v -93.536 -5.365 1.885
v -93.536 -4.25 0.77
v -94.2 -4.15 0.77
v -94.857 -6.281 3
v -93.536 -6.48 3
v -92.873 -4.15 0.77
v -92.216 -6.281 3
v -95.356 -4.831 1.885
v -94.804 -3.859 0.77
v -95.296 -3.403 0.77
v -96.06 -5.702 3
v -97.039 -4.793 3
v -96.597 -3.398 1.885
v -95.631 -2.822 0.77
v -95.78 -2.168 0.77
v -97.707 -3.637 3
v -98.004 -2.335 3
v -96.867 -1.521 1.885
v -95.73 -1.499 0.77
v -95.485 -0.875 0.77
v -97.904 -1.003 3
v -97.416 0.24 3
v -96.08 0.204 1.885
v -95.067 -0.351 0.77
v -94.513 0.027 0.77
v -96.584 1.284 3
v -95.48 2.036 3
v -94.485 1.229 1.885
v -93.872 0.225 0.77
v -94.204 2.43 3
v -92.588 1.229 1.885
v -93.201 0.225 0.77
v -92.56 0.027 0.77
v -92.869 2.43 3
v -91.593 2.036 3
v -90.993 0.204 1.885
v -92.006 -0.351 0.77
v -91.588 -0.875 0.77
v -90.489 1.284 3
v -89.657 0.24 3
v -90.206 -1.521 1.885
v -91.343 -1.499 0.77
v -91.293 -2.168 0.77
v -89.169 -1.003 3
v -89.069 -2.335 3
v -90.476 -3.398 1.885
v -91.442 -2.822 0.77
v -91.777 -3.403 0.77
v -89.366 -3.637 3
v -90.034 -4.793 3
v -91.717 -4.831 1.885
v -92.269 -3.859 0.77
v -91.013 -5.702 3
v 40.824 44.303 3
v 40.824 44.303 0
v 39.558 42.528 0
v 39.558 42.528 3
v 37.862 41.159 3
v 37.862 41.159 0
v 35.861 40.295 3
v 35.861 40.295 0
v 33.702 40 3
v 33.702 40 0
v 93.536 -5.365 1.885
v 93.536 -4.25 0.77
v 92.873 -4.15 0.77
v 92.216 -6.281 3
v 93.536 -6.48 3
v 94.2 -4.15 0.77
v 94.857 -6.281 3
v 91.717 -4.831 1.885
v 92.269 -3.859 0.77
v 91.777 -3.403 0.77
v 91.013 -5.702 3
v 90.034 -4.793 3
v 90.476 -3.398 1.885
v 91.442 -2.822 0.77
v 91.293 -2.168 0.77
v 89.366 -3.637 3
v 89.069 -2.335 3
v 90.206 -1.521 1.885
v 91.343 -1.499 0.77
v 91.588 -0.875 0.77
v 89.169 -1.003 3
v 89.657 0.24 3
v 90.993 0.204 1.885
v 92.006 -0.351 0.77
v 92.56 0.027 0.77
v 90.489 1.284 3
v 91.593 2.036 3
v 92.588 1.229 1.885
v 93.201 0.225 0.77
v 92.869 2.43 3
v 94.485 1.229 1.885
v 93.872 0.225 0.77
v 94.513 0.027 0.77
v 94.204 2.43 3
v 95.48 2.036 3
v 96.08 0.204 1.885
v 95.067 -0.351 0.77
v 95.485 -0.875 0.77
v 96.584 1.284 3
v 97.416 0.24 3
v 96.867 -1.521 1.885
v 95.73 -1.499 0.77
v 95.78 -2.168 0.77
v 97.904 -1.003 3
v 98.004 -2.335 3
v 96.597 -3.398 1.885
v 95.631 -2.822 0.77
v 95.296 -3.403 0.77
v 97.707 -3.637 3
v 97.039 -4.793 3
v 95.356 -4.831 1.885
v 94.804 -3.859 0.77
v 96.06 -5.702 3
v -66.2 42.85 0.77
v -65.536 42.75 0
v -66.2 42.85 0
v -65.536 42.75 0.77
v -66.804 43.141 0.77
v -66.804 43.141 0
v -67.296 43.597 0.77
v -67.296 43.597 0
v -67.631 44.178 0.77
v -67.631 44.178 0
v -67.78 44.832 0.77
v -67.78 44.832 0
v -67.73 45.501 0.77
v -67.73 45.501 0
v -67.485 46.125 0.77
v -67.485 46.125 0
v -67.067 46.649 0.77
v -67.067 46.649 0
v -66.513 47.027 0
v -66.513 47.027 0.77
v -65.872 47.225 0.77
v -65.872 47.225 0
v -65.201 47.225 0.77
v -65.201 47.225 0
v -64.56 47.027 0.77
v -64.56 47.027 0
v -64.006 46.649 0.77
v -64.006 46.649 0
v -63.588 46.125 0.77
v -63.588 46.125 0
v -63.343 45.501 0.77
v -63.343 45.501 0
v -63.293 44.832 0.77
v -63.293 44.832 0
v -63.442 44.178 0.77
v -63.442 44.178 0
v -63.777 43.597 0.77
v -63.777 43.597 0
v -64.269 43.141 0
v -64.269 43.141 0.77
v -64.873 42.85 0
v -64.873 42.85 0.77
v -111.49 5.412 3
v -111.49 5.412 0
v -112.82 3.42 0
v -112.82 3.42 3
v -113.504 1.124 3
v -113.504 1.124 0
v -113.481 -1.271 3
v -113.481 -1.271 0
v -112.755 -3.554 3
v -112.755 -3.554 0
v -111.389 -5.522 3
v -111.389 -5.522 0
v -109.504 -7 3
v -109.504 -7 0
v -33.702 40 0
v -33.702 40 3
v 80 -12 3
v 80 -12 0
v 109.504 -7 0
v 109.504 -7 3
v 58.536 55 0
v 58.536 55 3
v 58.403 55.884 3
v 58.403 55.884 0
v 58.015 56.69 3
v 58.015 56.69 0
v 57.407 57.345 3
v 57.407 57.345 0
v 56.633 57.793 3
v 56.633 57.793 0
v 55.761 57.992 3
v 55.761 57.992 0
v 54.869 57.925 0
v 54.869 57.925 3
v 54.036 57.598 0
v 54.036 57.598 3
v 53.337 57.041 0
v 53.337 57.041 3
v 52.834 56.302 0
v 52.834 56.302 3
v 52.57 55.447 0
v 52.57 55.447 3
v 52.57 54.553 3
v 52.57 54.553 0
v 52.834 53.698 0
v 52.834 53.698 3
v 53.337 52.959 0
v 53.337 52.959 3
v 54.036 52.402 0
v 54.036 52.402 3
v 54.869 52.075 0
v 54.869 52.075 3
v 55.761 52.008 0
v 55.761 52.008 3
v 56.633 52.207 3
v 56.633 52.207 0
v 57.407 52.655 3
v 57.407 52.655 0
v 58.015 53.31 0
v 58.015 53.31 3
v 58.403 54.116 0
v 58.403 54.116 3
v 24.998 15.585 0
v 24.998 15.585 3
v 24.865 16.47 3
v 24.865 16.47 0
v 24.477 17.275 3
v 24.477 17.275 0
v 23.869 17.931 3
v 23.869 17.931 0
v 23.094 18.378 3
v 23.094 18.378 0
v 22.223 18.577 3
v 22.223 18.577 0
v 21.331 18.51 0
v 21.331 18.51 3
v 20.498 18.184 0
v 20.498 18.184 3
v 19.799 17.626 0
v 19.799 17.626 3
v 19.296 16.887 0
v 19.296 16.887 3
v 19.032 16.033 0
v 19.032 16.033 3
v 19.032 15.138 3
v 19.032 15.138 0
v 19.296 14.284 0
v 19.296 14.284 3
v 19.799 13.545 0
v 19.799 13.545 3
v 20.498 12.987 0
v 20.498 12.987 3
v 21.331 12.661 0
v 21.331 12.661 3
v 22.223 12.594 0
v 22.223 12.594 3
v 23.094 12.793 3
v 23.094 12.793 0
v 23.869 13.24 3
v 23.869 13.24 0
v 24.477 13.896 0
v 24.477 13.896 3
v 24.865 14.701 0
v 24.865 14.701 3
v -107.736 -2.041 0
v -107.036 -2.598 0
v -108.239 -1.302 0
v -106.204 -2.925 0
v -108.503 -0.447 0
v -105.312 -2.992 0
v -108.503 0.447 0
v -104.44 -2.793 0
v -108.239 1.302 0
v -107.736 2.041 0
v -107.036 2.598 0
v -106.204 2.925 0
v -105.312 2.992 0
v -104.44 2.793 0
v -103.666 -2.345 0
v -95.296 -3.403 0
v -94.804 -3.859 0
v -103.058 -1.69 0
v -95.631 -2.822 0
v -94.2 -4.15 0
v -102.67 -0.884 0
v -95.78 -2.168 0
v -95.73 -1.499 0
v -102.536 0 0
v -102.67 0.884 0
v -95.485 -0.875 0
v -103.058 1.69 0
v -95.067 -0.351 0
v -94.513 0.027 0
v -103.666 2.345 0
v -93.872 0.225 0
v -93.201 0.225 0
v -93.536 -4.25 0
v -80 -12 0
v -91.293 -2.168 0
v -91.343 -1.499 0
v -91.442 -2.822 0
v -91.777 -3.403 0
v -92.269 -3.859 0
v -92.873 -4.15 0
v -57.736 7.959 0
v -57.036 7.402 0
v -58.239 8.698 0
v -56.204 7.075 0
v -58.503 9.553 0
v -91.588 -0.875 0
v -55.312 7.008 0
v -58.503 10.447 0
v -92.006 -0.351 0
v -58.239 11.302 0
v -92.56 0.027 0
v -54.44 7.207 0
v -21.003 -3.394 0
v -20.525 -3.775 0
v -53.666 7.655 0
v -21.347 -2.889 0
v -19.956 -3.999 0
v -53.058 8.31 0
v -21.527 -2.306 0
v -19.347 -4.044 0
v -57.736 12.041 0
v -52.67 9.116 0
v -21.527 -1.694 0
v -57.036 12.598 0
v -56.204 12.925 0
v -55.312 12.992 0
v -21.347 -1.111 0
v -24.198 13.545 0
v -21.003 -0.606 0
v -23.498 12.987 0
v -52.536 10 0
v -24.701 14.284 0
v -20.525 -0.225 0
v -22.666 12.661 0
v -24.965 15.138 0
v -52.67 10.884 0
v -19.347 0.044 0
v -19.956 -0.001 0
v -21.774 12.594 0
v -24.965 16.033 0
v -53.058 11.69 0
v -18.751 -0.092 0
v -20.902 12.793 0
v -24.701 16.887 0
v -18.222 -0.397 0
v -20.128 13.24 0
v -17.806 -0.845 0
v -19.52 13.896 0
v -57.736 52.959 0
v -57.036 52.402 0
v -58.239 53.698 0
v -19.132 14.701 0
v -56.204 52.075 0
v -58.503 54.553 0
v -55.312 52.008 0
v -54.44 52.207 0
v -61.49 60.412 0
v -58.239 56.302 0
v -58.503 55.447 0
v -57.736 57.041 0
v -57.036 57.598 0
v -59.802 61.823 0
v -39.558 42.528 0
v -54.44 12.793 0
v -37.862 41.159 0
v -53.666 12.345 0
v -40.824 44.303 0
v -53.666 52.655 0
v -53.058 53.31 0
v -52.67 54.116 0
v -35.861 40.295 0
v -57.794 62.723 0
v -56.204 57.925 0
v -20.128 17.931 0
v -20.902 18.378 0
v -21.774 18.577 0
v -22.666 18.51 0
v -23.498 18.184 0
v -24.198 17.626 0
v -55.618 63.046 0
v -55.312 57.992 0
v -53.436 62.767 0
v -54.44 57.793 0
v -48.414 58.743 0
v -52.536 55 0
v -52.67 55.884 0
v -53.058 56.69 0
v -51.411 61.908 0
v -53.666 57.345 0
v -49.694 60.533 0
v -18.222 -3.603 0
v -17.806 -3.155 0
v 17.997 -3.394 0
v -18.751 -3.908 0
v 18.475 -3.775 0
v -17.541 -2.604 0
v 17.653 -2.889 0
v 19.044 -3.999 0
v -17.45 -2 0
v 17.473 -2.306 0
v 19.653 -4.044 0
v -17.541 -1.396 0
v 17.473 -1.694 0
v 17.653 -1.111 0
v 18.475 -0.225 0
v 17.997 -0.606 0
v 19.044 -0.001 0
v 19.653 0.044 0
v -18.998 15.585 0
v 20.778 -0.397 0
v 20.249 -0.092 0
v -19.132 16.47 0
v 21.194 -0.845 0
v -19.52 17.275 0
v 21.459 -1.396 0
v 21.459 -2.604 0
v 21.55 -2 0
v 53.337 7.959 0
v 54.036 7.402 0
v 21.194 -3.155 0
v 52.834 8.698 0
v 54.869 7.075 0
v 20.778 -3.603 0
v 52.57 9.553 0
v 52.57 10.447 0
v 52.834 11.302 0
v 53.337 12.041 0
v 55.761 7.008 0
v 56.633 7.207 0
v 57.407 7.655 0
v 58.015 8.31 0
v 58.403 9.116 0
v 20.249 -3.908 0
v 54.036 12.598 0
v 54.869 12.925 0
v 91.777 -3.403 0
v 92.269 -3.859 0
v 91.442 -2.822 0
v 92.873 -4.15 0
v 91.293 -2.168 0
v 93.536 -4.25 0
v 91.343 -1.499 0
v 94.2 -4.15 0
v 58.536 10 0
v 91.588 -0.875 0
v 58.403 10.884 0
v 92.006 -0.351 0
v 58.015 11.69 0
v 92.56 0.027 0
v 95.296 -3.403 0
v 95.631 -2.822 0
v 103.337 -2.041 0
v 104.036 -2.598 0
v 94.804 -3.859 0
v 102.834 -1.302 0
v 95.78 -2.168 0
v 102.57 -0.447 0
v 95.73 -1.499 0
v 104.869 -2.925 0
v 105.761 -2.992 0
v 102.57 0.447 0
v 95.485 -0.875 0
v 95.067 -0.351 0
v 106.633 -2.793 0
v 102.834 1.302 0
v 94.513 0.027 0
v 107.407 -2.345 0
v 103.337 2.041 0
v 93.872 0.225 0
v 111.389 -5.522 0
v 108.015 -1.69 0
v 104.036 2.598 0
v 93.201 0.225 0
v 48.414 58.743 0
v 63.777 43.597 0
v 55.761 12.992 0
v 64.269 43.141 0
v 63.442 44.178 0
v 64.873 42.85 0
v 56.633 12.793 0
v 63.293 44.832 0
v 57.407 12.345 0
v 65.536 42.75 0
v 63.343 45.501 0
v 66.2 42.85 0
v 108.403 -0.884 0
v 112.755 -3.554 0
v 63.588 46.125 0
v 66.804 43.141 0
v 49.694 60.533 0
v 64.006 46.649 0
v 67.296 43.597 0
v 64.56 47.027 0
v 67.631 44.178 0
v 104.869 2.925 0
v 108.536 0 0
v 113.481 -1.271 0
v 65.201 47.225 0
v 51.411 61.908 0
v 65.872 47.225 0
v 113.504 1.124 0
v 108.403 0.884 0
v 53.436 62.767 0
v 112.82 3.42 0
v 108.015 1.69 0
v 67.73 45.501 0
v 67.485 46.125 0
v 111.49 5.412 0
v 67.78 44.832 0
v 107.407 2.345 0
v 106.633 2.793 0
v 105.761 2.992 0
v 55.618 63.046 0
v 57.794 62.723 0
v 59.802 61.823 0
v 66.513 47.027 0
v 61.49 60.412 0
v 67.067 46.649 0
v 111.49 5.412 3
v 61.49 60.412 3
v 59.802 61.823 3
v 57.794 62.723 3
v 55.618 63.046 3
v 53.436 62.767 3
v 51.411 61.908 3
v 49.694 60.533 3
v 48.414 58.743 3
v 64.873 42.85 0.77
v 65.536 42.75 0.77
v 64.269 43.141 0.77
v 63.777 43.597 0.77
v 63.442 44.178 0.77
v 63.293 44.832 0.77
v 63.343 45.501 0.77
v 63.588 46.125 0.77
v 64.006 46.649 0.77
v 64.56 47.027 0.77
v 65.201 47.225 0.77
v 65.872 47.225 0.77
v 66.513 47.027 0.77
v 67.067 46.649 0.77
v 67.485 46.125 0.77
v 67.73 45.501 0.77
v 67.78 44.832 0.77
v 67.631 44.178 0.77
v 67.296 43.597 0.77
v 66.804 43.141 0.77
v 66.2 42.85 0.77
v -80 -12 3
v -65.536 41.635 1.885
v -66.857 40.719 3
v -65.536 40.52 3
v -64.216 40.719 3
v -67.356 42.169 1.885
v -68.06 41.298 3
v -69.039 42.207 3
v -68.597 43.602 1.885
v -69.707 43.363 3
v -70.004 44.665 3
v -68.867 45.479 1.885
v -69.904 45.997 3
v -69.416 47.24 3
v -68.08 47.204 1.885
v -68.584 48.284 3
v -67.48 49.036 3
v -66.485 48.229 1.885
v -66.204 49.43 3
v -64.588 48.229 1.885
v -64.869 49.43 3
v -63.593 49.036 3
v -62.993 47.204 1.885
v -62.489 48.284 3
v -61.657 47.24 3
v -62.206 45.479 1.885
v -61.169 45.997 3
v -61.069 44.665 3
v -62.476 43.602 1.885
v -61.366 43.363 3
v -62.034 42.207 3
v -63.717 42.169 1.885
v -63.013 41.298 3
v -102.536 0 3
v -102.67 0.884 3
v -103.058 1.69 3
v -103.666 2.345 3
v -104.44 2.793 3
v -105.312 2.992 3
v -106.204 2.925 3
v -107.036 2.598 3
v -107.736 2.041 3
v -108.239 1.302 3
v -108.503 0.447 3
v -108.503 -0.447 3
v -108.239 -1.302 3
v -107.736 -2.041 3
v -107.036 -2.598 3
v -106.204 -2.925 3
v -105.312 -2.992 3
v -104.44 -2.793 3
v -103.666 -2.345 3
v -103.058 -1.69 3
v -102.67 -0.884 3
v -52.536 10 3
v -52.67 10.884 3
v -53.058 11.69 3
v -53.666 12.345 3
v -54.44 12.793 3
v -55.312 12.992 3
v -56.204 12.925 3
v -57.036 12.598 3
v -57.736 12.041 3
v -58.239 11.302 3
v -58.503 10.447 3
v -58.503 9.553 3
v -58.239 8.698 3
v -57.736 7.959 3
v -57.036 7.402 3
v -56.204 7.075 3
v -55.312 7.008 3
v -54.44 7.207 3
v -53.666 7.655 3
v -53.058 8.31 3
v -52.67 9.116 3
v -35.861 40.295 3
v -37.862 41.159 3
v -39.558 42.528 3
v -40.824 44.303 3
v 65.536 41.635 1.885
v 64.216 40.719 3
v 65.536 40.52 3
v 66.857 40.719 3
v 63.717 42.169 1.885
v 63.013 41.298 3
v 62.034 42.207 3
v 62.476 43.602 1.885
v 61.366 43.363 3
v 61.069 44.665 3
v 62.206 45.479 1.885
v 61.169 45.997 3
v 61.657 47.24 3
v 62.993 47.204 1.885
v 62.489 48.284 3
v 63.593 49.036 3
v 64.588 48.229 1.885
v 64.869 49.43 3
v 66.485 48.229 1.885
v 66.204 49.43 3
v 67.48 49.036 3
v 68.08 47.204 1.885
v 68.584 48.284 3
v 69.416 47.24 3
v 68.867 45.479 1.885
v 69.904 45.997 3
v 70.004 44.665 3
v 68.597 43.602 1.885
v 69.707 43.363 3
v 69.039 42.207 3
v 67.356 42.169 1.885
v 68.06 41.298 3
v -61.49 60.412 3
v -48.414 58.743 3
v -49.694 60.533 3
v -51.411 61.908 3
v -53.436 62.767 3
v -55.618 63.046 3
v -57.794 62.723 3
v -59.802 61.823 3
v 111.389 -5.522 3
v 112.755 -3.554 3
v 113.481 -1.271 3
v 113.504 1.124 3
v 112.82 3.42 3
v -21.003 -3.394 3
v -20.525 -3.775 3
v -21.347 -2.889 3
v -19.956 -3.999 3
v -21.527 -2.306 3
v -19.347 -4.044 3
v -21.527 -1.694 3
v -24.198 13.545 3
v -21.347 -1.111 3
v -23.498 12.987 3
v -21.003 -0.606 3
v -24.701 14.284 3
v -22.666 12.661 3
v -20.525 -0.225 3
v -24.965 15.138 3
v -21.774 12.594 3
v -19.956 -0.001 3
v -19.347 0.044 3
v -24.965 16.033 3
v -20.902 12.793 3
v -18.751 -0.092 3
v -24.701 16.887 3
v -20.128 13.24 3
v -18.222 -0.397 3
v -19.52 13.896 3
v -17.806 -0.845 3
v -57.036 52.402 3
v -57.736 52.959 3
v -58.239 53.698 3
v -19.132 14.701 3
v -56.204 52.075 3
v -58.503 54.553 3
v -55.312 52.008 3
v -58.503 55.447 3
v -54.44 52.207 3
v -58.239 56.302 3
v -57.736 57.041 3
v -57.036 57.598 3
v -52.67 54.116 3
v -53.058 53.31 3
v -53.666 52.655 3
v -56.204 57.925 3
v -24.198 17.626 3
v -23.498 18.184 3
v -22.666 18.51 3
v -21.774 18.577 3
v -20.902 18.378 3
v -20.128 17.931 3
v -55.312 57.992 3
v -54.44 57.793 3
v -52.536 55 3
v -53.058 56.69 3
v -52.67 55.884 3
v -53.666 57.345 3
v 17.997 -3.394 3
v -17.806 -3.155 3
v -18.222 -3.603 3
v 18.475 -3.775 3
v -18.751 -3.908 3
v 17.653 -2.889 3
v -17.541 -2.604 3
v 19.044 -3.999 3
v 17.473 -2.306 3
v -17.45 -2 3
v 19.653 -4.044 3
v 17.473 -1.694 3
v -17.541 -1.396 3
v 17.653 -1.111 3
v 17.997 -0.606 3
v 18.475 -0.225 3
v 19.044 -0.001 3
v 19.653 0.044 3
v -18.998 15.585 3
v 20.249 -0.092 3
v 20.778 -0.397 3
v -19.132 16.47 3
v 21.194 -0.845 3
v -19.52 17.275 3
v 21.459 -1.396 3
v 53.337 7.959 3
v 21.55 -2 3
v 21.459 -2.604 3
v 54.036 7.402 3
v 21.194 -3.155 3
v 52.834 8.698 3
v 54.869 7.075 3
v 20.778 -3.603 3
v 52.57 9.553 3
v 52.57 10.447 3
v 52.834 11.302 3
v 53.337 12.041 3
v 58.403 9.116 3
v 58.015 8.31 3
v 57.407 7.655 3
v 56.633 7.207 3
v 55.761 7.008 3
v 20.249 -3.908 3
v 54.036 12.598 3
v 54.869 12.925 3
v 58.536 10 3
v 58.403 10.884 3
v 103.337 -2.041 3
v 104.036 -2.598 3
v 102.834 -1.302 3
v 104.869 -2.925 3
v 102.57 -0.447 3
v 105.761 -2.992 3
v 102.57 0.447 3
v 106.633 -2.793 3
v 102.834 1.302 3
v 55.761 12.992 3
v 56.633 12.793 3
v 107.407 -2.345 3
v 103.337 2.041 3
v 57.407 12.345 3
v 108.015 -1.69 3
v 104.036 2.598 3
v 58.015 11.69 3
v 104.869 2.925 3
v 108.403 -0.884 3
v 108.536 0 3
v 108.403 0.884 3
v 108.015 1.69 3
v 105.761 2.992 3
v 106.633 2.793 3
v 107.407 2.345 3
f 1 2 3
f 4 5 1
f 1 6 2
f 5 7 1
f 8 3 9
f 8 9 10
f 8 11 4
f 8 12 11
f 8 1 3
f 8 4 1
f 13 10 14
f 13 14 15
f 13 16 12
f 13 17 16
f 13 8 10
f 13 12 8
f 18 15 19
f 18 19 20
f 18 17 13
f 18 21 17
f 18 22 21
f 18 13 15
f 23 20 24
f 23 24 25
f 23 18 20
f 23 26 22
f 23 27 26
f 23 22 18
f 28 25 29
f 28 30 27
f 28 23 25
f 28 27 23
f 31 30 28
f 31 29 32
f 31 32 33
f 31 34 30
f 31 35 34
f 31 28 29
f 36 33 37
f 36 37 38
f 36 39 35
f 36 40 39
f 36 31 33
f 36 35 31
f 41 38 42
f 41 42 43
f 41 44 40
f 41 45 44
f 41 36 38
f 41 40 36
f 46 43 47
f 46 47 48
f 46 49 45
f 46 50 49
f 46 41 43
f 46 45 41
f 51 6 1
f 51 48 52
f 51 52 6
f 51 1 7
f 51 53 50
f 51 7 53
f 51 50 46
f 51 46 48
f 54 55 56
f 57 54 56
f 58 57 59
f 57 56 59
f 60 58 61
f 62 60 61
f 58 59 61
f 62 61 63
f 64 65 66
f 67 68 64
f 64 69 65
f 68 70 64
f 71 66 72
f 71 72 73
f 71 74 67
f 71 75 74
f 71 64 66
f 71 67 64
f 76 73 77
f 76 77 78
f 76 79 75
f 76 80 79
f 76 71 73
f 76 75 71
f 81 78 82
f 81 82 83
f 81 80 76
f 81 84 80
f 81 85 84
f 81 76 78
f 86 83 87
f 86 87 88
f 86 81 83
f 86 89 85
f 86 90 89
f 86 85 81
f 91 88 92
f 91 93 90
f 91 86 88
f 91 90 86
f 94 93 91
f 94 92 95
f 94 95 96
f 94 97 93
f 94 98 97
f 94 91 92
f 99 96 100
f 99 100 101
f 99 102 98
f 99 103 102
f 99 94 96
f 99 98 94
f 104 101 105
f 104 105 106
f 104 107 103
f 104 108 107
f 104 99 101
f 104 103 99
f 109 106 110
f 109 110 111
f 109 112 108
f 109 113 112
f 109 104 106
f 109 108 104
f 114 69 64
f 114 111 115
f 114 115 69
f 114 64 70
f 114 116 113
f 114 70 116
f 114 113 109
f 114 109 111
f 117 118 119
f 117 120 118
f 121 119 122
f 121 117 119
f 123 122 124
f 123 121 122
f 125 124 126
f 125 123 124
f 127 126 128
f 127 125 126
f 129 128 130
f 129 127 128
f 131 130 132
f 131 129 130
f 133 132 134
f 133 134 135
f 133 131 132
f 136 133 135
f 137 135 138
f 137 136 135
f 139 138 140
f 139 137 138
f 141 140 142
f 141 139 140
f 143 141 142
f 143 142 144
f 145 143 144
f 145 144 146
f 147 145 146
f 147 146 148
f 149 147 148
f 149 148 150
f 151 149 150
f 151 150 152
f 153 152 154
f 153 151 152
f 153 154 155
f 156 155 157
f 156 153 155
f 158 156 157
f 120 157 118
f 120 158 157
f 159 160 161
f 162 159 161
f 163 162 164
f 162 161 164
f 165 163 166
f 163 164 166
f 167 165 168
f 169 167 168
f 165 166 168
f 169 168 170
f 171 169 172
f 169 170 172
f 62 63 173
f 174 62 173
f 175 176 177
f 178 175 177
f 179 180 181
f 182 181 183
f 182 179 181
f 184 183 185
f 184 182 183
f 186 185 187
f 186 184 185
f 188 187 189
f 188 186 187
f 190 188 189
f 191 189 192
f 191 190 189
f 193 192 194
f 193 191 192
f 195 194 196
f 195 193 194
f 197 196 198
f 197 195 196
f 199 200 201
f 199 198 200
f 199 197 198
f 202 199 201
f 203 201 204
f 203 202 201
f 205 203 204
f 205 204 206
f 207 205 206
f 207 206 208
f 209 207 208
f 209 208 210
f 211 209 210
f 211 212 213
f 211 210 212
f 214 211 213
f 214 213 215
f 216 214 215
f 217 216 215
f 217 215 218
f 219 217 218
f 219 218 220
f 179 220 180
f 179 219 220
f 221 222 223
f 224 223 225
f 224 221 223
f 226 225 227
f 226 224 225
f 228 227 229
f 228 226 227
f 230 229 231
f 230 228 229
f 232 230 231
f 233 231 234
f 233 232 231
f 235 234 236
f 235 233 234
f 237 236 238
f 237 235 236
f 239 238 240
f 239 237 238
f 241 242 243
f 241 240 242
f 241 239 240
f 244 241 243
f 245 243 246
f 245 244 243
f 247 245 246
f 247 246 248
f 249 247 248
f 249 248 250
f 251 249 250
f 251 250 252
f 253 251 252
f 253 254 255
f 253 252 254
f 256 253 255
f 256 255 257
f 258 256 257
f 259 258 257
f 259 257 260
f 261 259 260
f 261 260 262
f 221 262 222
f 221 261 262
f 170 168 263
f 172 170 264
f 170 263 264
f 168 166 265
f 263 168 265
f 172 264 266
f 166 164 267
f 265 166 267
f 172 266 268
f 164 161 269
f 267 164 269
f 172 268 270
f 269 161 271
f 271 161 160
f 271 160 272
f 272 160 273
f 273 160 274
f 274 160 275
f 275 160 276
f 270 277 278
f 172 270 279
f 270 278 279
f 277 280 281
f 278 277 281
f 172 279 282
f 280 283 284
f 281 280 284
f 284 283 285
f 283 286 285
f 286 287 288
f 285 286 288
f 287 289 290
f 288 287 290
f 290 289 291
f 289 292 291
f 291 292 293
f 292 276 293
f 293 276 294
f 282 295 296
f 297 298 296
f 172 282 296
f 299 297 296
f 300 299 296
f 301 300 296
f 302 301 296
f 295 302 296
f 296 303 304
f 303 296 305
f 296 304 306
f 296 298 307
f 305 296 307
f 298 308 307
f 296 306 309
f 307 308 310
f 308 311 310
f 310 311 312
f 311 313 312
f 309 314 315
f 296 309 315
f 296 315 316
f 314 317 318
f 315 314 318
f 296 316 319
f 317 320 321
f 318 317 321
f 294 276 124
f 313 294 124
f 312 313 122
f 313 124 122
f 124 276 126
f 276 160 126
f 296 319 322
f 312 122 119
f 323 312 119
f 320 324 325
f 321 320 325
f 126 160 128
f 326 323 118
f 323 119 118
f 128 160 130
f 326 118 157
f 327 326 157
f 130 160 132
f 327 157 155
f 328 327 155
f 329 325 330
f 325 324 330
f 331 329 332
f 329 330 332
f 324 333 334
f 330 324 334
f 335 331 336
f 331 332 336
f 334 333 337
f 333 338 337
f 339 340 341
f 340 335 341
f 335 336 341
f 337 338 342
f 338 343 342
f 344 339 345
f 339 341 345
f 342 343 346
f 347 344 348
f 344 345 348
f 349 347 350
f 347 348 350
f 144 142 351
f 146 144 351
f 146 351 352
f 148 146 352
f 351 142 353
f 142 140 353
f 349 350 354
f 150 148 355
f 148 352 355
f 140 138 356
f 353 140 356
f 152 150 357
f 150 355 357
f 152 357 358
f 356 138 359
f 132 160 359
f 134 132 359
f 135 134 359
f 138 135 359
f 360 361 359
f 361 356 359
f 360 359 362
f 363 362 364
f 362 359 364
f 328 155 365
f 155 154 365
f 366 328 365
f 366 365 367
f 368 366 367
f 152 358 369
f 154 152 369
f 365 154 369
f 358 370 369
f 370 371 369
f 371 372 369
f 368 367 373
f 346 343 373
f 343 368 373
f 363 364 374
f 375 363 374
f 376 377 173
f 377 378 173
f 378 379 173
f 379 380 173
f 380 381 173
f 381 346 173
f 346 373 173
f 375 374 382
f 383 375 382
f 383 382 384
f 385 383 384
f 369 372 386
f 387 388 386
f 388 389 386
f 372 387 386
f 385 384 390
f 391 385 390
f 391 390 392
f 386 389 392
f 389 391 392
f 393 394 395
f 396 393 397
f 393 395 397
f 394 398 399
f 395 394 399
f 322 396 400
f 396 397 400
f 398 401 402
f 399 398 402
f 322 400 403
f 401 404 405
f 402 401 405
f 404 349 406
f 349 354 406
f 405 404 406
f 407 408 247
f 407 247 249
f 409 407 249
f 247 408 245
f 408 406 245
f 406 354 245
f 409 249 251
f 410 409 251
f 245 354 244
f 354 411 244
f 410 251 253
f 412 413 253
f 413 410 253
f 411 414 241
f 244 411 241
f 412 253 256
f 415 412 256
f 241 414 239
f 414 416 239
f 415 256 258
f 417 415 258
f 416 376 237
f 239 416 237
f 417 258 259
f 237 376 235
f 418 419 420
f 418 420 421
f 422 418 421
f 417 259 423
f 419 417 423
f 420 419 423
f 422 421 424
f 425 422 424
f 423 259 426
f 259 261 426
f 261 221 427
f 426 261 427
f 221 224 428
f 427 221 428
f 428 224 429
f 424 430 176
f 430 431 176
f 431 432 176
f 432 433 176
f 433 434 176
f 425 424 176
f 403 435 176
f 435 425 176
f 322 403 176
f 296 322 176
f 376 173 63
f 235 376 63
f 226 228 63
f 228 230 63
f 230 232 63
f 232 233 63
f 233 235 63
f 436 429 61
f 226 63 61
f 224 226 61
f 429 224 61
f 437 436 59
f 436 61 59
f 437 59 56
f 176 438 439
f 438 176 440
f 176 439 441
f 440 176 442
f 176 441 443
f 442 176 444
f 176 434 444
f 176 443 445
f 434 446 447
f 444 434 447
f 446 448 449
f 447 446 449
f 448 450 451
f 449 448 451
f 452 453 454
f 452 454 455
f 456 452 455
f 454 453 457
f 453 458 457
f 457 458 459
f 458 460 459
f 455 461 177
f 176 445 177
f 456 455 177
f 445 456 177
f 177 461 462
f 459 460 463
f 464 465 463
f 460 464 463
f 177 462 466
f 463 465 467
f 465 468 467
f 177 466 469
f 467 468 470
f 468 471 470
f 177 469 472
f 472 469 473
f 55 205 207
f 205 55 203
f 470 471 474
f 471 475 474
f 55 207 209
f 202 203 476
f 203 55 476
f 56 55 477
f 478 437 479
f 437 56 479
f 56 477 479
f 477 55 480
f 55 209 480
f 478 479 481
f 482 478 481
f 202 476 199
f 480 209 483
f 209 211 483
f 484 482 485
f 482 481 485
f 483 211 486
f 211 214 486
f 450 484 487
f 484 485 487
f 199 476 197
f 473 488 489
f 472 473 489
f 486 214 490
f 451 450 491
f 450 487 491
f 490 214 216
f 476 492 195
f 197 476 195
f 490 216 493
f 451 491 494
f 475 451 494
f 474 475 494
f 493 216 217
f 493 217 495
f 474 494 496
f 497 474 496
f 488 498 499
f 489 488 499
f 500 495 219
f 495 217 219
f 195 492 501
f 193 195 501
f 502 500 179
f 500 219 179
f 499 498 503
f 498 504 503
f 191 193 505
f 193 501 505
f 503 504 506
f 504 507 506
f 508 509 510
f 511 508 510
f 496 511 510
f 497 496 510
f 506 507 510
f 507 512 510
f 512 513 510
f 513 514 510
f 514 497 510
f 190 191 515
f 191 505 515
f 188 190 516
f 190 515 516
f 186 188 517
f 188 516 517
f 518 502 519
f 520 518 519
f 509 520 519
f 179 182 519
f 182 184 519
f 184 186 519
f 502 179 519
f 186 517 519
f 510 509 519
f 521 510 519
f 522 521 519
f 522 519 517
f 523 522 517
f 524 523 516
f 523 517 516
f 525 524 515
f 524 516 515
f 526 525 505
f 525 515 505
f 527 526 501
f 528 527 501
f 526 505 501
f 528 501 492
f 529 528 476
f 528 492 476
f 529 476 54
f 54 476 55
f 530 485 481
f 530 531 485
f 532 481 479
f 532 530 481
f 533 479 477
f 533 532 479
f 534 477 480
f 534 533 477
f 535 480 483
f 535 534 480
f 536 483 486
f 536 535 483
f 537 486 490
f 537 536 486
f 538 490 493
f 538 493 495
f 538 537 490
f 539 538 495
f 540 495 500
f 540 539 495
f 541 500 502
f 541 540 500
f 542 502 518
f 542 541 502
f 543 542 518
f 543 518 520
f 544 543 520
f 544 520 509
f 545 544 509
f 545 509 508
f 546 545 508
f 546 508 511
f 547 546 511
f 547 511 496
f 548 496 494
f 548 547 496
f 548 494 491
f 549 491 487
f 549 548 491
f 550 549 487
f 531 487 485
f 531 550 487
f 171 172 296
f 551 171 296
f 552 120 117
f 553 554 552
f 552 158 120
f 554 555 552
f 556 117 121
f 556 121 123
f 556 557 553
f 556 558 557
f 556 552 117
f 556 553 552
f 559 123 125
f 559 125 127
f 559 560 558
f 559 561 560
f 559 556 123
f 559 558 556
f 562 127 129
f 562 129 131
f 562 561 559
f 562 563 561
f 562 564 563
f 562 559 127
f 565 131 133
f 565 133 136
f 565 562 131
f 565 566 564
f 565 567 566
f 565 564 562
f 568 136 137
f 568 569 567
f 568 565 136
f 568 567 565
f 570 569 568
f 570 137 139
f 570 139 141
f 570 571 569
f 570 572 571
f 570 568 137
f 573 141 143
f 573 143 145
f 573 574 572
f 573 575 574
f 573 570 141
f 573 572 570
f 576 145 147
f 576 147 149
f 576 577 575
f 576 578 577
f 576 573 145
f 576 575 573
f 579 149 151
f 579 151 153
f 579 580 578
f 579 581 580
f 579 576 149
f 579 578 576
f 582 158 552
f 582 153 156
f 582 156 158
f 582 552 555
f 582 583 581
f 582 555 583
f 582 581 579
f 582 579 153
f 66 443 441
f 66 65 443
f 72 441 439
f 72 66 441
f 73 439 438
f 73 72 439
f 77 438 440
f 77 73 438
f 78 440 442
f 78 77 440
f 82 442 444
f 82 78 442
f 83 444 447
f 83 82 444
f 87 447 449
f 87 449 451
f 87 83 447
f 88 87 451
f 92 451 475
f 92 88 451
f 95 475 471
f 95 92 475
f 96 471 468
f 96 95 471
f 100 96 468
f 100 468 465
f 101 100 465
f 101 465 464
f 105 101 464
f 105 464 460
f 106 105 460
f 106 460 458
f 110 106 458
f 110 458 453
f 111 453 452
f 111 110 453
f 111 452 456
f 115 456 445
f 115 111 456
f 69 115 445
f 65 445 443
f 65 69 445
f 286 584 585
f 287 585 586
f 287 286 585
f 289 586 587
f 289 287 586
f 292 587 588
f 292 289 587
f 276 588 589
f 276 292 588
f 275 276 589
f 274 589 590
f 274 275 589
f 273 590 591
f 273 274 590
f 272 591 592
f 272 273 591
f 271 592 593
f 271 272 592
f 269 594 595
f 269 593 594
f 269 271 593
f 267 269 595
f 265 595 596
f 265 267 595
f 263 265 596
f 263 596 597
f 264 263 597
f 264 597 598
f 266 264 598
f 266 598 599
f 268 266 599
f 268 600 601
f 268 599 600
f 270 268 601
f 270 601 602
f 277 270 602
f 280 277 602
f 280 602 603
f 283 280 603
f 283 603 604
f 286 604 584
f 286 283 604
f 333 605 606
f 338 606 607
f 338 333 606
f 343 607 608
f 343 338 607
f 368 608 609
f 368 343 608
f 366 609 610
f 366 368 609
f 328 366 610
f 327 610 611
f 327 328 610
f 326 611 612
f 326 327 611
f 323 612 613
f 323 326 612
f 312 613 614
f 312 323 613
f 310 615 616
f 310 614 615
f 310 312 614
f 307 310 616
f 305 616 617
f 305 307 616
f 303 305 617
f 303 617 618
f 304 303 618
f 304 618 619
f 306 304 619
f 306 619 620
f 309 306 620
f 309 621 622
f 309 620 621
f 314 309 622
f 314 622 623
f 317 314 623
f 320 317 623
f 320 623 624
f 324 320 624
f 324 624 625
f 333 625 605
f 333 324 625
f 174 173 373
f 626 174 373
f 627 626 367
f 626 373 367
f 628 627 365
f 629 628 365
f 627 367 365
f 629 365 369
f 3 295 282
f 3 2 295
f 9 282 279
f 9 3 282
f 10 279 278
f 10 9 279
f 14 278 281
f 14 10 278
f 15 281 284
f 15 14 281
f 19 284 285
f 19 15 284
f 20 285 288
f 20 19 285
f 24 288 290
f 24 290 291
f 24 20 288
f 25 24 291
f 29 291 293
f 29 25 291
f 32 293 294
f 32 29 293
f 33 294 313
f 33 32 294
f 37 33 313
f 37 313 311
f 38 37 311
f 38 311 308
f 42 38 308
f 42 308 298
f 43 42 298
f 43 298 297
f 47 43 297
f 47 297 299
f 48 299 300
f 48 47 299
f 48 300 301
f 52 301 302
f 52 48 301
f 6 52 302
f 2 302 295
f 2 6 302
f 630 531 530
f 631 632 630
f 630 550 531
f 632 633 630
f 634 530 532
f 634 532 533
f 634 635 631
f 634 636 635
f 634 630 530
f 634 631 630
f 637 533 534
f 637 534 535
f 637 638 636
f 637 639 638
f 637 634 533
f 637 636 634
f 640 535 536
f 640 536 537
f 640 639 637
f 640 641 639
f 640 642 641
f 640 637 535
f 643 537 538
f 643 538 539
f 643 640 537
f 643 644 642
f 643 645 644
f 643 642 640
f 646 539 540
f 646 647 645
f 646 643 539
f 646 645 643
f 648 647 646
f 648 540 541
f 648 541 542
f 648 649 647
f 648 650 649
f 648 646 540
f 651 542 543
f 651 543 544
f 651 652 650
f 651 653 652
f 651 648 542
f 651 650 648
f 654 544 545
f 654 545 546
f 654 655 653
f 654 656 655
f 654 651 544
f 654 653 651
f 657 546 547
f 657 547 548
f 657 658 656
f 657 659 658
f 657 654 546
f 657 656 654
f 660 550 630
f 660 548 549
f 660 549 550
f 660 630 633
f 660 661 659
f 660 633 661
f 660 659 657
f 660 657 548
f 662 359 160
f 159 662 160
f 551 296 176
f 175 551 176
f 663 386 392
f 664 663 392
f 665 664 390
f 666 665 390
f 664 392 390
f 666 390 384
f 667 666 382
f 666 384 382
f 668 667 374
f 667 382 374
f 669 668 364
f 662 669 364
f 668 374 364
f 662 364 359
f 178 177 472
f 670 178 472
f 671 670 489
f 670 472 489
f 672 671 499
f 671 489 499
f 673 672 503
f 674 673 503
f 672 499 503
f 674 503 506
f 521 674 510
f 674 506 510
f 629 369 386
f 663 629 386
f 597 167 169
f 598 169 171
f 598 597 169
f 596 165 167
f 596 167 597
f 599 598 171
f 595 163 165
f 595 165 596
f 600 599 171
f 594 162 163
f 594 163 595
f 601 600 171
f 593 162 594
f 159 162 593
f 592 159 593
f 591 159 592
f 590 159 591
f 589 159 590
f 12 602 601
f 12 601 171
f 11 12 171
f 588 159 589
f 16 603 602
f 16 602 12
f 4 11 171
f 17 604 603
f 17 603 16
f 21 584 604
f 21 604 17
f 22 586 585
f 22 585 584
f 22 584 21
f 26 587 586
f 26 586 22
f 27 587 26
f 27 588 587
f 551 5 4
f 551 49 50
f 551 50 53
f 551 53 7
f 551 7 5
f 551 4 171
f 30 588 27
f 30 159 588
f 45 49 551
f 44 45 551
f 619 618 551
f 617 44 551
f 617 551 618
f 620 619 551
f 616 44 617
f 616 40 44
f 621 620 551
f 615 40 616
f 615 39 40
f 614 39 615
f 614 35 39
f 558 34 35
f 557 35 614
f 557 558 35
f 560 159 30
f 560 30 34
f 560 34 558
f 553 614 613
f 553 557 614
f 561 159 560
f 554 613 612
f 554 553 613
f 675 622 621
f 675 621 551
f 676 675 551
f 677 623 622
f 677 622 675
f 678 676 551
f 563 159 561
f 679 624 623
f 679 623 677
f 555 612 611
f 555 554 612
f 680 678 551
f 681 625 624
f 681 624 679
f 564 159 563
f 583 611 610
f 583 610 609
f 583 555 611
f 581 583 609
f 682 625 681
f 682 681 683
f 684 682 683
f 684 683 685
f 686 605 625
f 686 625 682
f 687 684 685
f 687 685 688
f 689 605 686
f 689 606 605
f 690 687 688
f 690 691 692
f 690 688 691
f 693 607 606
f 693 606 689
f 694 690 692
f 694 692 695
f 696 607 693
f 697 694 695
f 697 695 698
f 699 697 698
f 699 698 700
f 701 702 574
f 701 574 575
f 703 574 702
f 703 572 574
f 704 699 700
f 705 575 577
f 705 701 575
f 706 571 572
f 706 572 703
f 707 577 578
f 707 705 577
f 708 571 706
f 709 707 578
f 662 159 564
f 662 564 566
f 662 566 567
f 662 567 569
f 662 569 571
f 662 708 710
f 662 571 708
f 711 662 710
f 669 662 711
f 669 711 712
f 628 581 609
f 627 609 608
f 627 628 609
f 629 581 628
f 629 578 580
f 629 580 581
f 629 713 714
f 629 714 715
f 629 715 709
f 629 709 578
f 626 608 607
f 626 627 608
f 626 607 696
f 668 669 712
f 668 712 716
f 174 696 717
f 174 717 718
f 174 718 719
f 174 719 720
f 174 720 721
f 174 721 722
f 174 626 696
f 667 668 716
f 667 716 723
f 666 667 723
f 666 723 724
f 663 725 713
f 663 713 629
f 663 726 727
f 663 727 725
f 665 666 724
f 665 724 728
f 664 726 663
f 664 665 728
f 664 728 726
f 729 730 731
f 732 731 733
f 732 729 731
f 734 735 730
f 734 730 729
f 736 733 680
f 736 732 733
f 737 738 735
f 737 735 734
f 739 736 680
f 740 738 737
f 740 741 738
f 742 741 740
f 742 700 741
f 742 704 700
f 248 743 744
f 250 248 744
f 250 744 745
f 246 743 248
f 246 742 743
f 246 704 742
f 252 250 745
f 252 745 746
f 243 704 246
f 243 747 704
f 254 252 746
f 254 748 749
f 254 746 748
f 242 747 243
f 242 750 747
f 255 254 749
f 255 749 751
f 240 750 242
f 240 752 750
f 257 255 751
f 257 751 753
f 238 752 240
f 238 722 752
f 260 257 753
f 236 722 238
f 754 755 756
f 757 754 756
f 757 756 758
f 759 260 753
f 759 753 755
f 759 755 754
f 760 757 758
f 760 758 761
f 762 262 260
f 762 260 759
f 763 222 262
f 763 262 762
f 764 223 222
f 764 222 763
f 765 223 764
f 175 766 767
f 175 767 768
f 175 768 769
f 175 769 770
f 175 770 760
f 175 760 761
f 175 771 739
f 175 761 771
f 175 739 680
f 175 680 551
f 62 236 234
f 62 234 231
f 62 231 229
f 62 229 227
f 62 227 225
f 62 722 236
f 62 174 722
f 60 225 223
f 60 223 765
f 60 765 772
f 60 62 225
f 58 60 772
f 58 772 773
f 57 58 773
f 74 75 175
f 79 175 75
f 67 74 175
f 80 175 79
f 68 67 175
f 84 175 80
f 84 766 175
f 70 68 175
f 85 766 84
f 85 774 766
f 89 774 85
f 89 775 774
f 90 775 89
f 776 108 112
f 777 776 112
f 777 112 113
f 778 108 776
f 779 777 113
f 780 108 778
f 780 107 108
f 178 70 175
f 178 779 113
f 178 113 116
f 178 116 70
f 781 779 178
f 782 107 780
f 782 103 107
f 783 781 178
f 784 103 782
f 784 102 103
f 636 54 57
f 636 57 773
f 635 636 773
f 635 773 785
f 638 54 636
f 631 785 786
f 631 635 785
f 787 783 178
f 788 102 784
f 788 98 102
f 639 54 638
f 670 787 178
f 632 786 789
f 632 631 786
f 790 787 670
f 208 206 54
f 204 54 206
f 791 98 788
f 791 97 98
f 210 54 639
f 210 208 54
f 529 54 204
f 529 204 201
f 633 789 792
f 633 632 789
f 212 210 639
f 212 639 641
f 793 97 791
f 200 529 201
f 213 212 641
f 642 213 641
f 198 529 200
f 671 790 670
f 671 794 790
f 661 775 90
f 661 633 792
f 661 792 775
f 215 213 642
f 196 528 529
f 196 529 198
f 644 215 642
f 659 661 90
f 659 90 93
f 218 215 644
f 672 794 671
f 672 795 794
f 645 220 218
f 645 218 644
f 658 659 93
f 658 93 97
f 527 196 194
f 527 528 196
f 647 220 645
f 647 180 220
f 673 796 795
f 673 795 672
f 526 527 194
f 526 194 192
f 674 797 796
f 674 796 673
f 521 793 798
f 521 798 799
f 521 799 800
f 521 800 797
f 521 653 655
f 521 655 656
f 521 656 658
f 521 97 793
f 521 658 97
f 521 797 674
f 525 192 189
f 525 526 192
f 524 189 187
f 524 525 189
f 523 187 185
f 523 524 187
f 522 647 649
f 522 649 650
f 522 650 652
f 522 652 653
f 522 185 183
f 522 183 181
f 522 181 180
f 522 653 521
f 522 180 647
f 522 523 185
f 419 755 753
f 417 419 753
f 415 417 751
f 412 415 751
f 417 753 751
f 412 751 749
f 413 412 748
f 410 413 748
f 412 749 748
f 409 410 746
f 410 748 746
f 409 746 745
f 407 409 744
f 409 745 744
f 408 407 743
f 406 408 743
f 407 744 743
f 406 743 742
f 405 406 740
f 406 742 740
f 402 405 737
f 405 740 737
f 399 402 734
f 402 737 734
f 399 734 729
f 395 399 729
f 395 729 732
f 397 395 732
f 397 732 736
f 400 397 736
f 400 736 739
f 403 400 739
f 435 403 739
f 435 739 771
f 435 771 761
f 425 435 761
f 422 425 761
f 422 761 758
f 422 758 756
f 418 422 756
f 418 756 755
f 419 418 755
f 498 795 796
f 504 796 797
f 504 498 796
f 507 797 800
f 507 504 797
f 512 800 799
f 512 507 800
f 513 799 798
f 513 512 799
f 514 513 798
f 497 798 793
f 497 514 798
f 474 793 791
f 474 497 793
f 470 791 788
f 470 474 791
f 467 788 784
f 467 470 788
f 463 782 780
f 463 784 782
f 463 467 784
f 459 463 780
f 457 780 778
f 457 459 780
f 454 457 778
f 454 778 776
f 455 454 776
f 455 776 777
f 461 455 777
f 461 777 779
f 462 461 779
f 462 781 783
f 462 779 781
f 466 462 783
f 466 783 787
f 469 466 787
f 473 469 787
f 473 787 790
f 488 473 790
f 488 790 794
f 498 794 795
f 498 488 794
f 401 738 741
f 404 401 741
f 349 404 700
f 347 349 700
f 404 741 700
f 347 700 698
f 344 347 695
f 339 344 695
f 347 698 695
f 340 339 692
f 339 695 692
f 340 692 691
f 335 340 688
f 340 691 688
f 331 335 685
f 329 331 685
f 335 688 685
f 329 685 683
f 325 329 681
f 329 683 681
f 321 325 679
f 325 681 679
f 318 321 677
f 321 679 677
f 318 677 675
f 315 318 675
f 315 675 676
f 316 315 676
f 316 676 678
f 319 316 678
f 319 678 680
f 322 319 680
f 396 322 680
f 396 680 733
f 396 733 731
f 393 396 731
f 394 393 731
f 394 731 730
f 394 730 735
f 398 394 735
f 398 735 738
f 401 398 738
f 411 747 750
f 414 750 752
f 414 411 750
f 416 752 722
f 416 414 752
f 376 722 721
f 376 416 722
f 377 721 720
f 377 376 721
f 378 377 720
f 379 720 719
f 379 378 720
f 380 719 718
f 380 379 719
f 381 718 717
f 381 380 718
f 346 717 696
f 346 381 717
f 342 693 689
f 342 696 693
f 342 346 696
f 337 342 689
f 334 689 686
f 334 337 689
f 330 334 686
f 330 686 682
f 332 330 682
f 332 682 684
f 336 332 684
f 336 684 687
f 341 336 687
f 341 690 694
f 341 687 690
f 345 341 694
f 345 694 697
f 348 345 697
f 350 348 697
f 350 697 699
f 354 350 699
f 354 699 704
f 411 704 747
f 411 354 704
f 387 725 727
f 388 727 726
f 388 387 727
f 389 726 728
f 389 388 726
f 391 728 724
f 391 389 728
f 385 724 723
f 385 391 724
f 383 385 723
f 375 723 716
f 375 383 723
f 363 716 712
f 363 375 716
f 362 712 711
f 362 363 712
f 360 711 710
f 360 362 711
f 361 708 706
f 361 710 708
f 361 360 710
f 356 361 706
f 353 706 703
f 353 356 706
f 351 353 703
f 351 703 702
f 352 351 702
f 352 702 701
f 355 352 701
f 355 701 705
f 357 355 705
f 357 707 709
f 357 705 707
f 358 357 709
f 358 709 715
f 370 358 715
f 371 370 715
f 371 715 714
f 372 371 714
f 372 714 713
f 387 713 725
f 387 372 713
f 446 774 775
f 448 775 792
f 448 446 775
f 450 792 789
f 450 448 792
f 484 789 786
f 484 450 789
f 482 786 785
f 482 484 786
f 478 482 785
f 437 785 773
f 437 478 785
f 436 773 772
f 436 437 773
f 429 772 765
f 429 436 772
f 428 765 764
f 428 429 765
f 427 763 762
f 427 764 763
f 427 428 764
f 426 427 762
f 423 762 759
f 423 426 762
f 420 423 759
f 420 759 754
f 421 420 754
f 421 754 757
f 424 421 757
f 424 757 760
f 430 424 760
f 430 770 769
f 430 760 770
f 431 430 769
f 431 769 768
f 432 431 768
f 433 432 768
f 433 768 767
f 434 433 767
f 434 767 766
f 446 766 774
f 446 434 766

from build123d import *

# Parameters (mm, degrees)
PLATE_DEPTH                  = 3
SKETCH4_R                    = 3
PIVOT_HOLES_ARM_DEPTH        = 4
SKETCH5_R                    = 2.05
CHASSIS_HOLES_DEPTH          = 4
CSK_FOR_M4_SFHCS1_AT_2_COUNT = 2
CSK_FOR_M4_SFHCS1_AT_2_PITCH = 54.708317466
CSK_FOR_M4_SFHCS1_AT_3_COUNT = 2
CSK_FOR_M4_SFHCS1_AT_3_PITCH = 165.871053731
CSK_FOR_M4_SFHCS1_AT_4_COUNT = 2
CSK_FOR_M4_SFHCS1_AT_4_PITCH = 187.072959568


with BuildPart() as part:
    # Sketch2 → Plate (new body)
    with BuildSketch(Plane.XY):
        with BuildLine():
            Line((-80, -12), (80, -12))
            Line((80, -12), (109.503808991, -7))
            ThreePointArc((109.503808991, -7), (113.481492527, -1.271406135), (111.490110497, 5.412391557))
            Line((111.490110497, 5.412391557), (61.490110497, 60.412391557))
            ThreePointArc((61.490110497, 60.412391557), (54.517770463, 62.981349031), (48.414233747, 58.743435912))
            Line((48.414233747, 58.743435912), (40.824196955, 44.302662586))
            ThreePointArc((40.824196955, 44.302662586), (37.862458518, 41.159163218), (33.701950918, 40))
            Line((33.701950918, 40), (-33.701950918, 40))
            ThreePointArc((-33.701950918, 40), (-37.862458518, 41.159163218), (-40.824196955, 44.302662586))
            Line((-40.824196955, 44.302662586), (-48.414233747, 58.743435912))
            ThreePointArc((-48.414233747, 58.743435912), (-54.517770463, 62.981349031), (-61.490110497, 60.412391557))
            Line((-61.490110497, 60.412391557), (-111.490110497, 5.412391557))
            ThreePointArc((-111.490110497, 5.412391557), (-113.481492527, -1.271406135), (-109.503808991, -7))
            Line((-109.503808991, -7), (-80, -12))
        make_face()
    extrude(amount=PLATE_DEPTH)

    # Sketch4 → Pivot holes (arm) (cut, through all)
    with BuildSketch(Plane.XY):
        with Locations((105.536479784, 0)):
            Circle(SKETCH4_R)
        with Locations((55.536479784, 10)):
            Circle(SKETCH4_R)
        with Locations((55.536479784, 55)):
            Circle(SKETCH4_R)
        with Locations((-105.536479784, 0)):
            Circle(SKETCH4_R)
        with Locations((-55.536479784, 10)):
            Circle(SKETCH4_R)
        with Locations((-55.536479784, 55)):
            Circle(SKETCH4_R)
        with Locations((-21.998408138, 15.585494631)):
            Circle(SKETCH4_R)
        with Locations((21.998408138, 15.585494631)):
            Circle(SKETCH4_R)
    extrude(amount=PIVOT_HOLES_ARM_DEPTH, mode=Mode.SUBTRACT)

    # Sketch5 → Chassis holes (cut, through all)
    with BuildSketch(Plane.XY.offset(3)):
        with Locations((-19.5, -2)):
            Circle(SKETCH5_R)
        with Locations((19.5, -2)):
            Circle(SKETCH5_R)
    extrude(amount=-CHASSIS_HOLES_DEPTH, mode=Mode.SUBTRACT)

    # Sketch7 → CSK for M4 SFHCS1 (revolve, cut)
    with BuildSketch(Plane(origin=(93.536479784, -2, 3), x_dir=(0, -1, 0), z_dir=(1, 0, 0))):
        Polygon((0, 0), (0, 3), (2.25, 3), (2.25, 2.23), (4.48, 0), align=None)
    csk_for_m4_sfhcs1 = revolve(axis=Axis((93.536479784, -2, 9.35), (0, 0, -1)), mode=Mode.SUBTRACT)

    # CSK for M4 SFHCS1 at 2: CSK for M4 SFHCS1 ×2
    with Locations(*[Vector(-0.511805175, 0.859101544, 0) * (i * CSK_FOR_M4_SFHCS1_AT_2_PITCH) for i in range(1, CSK_FOR_M4_SFHCS1_AT_2_COUNT)]):
        add(csk_for_m4_sfhcs1, mode=Mode.SUBTRACT)

    # CSK for M4 SFHCS1 at 3: CSK for M4 SFHCS1 ×2
    with Locations(*[Vector(-0.95901579, 0.283352634, 0) * (i * CSK_FOR_M4_SFHCS1_AT_3_PITCH) for i in range(1, CSK_FOR_M4_SFHCS1_AT_3_COUNT)]):
        add(csk_for_m4_sfhcs1, mode=Mode.SUBTRACT)

    # CSK for M4 SFHCS1 at 4: CSK for M4 SFHCS1 ×2
    with Locations(*[(-i * CSK_FOR_M4_SFHCS1_AT_4_PITCH, 0, 0) for i in range(1, CSK_FOR_M4_SFHCS1_AT_4_COUNT)]):
        add(csk_for_m4_sfhcs1, mode=Mode.SUBTRACT)


solid = part.part
